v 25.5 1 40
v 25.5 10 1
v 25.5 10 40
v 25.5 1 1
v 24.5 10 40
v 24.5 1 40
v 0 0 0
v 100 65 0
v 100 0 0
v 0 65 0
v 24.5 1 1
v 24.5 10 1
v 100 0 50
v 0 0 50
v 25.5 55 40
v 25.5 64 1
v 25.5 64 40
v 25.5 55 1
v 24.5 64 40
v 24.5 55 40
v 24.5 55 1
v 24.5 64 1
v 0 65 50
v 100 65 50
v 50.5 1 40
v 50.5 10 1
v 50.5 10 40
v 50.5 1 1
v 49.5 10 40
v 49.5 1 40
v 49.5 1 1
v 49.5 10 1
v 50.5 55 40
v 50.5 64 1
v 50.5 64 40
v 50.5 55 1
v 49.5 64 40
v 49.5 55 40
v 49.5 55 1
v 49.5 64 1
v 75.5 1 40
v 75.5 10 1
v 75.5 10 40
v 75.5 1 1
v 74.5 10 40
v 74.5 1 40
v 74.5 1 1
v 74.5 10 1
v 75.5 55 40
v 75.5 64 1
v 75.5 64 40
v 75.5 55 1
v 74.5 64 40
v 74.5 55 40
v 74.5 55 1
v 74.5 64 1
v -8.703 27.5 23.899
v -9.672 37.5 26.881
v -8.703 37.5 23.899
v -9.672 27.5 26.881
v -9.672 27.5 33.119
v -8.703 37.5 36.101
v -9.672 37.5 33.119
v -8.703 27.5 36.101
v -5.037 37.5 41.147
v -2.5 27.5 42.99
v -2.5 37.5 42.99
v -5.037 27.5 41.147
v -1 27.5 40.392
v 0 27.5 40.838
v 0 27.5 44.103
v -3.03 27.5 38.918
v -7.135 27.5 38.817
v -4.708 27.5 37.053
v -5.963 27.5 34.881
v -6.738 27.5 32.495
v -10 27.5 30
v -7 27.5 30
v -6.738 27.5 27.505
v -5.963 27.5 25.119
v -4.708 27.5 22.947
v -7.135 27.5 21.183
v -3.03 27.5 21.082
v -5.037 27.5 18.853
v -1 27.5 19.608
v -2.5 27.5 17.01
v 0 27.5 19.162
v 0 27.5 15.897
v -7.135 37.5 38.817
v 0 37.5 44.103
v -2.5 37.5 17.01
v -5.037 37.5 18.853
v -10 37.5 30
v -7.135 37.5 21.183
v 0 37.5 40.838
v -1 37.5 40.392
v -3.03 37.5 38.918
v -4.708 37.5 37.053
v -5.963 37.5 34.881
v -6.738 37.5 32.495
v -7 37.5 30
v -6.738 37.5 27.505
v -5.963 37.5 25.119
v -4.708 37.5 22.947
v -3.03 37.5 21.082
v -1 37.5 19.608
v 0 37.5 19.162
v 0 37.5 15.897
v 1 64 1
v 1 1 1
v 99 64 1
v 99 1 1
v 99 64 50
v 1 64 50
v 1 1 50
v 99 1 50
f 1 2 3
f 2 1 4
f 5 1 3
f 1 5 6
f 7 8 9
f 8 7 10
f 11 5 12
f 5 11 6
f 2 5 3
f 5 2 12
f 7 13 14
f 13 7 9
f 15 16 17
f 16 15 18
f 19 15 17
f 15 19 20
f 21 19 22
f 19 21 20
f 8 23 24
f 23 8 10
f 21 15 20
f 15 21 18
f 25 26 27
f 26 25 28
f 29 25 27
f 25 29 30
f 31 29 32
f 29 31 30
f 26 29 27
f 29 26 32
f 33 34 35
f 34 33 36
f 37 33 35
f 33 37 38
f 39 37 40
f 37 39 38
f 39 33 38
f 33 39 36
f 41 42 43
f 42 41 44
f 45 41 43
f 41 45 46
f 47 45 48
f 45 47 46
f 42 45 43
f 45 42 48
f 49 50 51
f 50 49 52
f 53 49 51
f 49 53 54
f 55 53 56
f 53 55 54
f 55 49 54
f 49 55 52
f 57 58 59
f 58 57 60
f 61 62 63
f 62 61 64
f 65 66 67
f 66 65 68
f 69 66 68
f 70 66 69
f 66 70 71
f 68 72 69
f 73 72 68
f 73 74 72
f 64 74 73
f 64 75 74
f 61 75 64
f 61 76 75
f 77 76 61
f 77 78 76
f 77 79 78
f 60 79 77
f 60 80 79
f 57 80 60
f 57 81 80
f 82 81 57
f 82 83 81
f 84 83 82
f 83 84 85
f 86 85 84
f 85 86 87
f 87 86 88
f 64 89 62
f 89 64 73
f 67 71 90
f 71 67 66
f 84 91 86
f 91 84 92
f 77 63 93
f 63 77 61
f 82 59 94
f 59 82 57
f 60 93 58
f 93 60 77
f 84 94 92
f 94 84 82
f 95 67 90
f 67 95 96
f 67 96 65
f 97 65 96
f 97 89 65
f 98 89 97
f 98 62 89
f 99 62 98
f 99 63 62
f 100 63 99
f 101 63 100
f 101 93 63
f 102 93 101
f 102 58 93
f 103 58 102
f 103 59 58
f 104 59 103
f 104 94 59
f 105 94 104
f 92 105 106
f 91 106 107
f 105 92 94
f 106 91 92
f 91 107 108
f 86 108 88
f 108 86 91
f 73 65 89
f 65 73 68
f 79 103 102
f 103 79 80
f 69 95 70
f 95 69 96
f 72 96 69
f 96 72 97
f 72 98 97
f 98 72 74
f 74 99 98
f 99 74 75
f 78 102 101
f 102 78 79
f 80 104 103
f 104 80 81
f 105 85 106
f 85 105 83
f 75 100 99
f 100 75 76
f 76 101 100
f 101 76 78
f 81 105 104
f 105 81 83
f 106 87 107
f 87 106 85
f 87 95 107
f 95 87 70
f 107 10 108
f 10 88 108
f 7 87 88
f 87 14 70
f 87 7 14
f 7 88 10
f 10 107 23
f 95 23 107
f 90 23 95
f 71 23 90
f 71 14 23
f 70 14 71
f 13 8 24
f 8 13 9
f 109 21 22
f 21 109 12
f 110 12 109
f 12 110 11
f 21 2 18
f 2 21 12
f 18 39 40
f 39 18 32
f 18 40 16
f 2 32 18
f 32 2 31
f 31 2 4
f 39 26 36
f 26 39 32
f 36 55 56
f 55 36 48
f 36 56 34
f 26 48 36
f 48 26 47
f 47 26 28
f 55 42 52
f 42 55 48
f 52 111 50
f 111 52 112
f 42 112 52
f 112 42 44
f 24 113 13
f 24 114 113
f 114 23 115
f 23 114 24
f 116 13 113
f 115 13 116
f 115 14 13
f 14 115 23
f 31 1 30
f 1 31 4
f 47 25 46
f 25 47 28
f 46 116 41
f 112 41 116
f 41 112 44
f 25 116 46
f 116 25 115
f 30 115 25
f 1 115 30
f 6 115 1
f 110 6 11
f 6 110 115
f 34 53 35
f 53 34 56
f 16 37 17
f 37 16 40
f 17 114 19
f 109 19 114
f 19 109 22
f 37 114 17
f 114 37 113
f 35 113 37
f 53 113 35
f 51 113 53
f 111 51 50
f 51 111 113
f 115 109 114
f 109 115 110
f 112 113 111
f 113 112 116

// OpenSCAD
THICKNESS=1;
DEPTH=100;
WIDTH=65;
HEIGHT=50;

NGUIDES=3;
NDIVIDERS=0;

TAB = true;

cube([DEPTH,WIDTH,THICKNESS]);
cube([DEPTH,THICKNESS,HEIGHT]);
translate([0,WIDTH-THICKNESS,0]) cube([DEPTH,THICKNESS,HEIGHT]);
cube([THICKNESS,WIDTH,HEIGHT]);
translate([DEPTH-THICKNESS,0,0]) cube([THICKNESS,WIDTH,HEIGHT]);

if (NGUIDES > 0) for (i = [1 : NGUIDES]) {
translate([i * DEPTH/(NGUIDES+1)-THICKNESS/2,0,0]) cube([THICKNESS,10,40]);
translate([i* DEPTH/(NGUIDES+1)-THICKNESS/2,55,0]) cube([THICKNESS,10,40]);
}
if (NDIVIDERS > 0) for (i = [1 : NDIVIDERS]) {
translate([i * 100/(NDIVIDERS+1)-THICKNESS/2,0,0]) cube([THICKNESS,55,HEIGHT-10]);
translate([i* 100/(NDIVIDERS+1)-THICKNESS/2,55,0]) cube([THICKNESS,10,HEIGHT-10]);
}

/*
if (TAB) {
translate([5, WIDTH/2, HEIGHT/2 + 10])
difference() {
cylinder(10, 20, 20, true);
cylinder(12, 15, 15, true);
translate([15,0,0]) cube([40, 50, 20], true);
}
}
*/

if (TAB) {
translate([5, WIDTH*0.5, 5+HEIGHT/2])
rotate(90, [1, 0, 0])
difference() {
cylinder(10, 15, 15, true);
cylinder(12, 12, 12, true);
translate([15,0,0]) cube([40, 50, 20], true);
}
}

/*
if (TAB) {
translate([0, WIDTH/2, HEIGHT/2 + 10])
difference() {
cylinder(10, 2, 20, true);
cylinder(12, 0, 18, true);
translate([20,0,0]) cube([40, 50, 20], true);
}
}
*/
